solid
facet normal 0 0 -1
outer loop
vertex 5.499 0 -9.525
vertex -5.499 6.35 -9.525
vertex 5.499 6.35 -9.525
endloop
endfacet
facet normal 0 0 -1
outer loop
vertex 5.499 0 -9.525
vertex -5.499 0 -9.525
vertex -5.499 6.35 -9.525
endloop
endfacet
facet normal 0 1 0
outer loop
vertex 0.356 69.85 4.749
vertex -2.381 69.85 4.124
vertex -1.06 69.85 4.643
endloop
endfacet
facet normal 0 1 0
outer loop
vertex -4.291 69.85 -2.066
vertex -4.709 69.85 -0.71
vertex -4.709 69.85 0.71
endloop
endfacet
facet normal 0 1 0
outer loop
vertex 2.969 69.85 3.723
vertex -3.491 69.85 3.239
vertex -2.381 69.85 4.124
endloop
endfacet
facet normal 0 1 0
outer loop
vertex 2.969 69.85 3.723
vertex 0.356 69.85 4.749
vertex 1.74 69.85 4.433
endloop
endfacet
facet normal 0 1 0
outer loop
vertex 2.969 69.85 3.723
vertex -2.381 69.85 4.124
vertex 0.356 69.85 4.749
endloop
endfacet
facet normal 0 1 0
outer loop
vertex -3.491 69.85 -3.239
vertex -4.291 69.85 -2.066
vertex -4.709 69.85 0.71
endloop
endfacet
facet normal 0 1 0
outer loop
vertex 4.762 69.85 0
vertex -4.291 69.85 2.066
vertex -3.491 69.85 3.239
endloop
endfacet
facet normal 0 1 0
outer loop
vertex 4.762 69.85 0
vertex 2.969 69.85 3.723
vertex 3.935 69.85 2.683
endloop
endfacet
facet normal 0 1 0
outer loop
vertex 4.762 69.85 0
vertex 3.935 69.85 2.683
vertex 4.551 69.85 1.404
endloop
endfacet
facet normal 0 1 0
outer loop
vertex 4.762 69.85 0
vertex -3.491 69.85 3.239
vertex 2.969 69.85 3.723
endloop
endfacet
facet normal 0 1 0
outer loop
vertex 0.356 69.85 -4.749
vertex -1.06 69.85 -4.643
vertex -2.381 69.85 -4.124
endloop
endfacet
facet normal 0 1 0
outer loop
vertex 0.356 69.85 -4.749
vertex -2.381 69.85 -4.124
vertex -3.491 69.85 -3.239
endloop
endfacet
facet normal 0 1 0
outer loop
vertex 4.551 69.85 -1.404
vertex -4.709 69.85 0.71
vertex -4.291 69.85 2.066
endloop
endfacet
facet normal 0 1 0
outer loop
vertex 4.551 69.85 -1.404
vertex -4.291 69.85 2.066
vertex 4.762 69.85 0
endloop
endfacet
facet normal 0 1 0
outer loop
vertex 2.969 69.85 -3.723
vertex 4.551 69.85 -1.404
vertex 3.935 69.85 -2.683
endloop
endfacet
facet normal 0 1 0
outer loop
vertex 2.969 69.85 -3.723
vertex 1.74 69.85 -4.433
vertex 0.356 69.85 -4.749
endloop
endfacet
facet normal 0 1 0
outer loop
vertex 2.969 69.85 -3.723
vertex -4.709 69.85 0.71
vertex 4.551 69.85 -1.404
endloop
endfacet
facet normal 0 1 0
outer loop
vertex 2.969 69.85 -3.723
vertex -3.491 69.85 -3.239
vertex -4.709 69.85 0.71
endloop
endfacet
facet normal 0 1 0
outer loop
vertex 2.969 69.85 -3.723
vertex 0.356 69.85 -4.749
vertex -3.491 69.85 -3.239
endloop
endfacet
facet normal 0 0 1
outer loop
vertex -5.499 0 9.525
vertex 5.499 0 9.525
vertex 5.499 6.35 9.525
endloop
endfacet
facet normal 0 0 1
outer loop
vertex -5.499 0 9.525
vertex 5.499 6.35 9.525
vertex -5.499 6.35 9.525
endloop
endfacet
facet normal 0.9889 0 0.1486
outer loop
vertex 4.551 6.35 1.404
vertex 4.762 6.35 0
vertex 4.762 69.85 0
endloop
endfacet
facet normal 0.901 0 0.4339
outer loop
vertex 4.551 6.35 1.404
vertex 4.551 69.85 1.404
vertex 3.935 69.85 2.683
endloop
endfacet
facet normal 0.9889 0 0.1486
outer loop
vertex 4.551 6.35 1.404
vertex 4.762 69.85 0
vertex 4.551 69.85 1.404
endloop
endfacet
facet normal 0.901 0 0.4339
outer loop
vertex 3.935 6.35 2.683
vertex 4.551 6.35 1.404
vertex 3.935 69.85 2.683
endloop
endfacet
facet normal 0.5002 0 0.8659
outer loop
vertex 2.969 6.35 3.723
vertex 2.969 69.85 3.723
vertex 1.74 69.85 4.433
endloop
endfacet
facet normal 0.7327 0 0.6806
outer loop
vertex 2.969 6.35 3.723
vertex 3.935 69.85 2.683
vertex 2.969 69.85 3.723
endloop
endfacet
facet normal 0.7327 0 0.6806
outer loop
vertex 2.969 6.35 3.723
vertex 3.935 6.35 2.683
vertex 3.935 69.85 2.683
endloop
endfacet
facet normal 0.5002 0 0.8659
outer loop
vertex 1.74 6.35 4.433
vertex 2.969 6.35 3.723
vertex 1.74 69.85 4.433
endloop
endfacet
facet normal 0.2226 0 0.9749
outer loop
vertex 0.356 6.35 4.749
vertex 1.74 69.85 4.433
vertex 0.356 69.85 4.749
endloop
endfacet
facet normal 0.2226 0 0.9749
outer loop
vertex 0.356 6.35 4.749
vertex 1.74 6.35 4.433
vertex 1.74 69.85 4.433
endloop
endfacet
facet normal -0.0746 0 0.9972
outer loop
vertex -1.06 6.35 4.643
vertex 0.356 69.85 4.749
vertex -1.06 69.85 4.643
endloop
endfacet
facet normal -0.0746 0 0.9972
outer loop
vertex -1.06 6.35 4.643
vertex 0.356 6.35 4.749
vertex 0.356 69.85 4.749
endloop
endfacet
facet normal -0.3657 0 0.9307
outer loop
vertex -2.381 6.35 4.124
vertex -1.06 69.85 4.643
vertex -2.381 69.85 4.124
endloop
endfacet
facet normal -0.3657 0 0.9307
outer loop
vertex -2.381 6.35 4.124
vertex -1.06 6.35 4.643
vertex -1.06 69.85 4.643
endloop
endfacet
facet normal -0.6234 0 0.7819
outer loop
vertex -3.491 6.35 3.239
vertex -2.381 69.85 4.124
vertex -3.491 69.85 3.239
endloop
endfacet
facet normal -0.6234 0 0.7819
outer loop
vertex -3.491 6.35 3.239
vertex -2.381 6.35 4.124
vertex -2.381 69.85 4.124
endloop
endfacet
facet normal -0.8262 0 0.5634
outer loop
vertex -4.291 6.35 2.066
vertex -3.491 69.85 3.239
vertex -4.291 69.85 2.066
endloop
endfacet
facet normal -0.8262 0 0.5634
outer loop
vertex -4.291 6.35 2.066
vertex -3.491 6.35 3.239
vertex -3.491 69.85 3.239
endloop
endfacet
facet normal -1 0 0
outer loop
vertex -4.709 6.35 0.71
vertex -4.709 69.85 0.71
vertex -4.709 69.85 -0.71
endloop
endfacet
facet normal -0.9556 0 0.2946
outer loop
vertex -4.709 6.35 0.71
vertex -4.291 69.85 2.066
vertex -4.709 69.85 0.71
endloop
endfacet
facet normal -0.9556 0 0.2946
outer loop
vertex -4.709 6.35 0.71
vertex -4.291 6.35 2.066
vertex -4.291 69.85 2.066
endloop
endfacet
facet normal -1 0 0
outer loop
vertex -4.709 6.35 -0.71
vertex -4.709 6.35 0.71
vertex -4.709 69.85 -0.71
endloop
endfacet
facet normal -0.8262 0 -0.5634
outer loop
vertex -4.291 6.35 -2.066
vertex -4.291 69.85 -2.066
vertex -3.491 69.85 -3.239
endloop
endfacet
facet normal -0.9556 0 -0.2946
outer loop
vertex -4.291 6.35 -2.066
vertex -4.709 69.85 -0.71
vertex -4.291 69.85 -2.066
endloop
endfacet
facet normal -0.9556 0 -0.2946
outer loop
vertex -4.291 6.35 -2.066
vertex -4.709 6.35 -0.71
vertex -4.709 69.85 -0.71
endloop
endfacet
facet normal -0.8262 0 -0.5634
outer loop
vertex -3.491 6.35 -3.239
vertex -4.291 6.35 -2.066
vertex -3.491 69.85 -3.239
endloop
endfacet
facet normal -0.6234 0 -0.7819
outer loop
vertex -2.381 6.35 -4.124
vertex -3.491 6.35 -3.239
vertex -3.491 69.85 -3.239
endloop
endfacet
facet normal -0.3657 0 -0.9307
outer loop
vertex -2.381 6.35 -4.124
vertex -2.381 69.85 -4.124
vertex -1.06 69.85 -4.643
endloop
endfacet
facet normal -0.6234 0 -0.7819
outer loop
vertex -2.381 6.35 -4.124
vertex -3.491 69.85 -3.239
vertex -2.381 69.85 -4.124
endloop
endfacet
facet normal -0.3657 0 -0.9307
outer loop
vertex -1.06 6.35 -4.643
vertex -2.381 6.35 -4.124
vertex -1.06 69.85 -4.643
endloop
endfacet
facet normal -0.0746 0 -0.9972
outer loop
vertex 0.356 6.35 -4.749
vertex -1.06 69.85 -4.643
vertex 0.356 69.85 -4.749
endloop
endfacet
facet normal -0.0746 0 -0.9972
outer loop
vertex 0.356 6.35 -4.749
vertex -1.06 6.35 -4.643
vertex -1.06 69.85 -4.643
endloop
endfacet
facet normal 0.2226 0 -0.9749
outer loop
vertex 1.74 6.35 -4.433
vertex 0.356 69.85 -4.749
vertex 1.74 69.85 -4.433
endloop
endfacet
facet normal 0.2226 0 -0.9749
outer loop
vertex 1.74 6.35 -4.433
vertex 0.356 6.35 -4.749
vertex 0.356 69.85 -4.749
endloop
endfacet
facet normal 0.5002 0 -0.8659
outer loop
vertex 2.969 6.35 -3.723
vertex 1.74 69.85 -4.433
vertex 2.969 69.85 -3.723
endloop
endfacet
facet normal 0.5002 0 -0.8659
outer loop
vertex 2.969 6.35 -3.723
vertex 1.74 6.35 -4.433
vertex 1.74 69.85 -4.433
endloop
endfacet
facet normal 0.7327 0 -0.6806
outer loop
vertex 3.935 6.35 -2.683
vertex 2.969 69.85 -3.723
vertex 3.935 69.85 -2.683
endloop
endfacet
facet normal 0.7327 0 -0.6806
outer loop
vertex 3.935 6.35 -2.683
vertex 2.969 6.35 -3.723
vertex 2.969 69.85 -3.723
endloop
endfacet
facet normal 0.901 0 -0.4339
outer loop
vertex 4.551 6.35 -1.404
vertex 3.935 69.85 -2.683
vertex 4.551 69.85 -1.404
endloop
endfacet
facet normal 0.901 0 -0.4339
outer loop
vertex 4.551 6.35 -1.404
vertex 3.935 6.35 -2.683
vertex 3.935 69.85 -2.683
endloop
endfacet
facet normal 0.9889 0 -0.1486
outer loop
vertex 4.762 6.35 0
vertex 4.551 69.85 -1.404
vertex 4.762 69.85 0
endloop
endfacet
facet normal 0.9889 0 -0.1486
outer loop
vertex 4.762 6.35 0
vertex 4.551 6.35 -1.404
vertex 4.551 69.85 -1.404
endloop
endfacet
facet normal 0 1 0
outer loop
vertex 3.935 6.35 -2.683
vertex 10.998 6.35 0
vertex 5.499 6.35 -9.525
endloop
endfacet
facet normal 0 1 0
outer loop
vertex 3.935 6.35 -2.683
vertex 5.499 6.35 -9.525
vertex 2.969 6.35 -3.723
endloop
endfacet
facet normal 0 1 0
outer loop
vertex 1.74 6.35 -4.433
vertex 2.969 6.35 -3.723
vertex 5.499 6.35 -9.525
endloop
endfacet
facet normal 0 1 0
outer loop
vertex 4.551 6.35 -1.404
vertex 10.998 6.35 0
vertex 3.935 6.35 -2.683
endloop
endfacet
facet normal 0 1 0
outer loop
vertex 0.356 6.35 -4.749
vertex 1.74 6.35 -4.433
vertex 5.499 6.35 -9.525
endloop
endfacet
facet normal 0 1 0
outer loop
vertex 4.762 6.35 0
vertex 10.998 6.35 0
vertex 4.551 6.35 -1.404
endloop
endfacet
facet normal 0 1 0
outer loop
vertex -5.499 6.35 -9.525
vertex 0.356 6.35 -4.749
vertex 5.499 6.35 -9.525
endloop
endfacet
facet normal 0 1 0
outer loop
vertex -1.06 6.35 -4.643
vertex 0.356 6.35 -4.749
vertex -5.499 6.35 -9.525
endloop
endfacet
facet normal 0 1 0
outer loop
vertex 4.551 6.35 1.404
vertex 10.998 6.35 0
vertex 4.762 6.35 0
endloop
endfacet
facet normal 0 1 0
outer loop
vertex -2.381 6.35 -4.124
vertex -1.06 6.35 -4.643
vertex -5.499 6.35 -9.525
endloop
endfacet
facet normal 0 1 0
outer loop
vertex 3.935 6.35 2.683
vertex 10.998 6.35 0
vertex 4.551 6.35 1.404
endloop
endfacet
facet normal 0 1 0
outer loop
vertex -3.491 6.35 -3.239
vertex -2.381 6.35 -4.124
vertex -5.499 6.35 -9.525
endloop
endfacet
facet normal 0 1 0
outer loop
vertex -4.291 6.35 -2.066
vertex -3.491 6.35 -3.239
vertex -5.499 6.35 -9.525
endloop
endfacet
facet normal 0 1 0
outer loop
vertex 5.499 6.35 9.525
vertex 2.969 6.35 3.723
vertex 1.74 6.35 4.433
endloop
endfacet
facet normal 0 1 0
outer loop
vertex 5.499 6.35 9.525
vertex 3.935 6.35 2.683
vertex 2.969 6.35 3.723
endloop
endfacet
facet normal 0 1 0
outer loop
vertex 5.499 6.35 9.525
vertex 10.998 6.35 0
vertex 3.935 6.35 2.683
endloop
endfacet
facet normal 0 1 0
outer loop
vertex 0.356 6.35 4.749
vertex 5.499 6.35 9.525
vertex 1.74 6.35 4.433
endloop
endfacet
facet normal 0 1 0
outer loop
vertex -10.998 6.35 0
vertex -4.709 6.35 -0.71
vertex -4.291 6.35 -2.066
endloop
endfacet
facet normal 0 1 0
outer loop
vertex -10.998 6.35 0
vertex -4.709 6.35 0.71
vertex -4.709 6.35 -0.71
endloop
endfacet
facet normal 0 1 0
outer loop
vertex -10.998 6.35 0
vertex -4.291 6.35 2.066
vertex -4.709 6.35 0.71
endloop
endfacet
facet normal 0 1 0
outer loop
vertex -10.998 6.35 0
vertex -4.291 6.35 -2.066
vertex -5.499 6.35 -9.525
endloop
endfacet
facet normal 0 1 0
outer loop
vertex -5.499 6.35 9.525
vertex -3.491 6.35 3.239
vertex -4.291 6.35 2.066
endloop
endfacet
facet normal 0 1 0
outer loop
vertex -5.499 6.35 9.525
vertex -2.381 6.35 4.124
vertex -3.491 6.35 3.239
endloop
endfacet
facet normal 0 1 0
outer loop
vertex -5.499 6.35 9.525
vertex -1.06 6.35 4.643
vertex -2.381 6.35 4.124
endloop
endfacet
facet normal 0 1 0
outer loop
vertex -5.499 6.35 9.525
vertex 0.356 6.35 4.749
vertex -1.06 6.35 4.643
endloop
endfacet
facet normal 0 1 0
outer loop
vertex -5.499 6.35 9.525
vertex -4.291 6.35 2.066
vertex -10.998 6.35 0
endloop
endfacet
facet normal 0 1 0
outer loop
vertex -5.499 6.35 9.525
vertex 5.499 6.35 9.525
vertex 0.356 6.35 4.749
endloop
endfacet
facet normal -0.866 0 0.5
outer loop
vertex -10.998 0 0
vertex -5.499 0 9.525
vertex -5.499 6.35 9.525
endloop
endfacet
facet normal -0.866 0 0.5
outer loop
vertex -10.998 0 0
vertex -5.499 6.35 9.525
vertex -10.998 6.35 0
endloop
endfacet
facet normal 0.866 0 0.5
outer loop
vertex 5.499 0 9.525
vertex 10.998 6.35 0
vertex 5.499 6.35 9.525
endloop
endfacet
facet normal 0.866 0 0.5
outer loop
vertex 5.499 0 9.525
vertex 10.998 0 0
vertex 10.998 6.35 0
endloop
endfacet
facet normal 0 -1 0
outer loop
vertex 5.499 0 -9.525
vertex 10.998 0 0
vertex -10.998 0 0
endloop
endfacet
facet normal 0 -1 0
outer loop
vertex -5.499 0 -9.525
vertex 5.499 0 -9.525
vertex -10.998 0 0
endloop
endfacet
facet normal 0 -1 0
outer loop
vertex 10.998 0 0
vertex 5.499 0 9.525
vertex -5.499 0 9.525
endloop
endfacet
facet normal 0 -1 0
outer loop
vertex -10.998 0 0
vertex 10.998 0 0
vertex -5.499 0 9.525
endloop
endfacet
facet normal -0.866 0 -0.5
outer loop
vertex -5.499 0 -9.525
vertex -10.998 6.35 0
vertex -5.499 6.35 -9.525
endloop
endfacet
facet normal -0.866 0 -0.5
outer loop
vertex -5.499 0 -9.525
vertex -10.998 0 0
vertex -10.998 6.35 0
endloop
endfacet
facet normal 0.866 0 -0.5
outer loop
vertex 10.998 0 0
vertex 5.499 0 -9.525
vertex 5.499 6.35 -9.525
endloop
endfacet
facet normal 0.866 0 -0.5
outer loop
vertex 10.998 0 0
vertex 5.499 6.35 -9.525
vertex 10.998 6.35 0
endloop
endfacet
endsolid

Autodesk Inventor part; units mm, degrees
ref_plane "YZ Plane" through (0, 0, 0) normal (1, 0, 0) x (0, 1, 0)
ref_plane "XZ Plane" through (0, 0, 0) normal (0, 1, 0) x (-1, 0, 0)
ref_plane "XY Plane" through (0, 0, 0) normal (0, 0, 1) x (1, 0, 0)
sketch "Sketch1" plane through (0, 0, 0) normal (0, 1, 0) x (-1, 0, 0)
  line L0 (10.9985, 0) -> (5.4993, -9.525)
  line L1 (5.4993, -9.525) -> (-5.4993, -9.525)
  line L2 (-5.4993, -9.525) -> (-10.9985, 0)
  line L3 (-10.9985, 0) -> (-5.4993, 9.525)
  line L4 (-5.4993, 9.525) -> (5.4993, 9.525)
  line L5 (5.4993, 9.525) -> (10.9985, 0)
  point P0 (0, 0)
  point P1 (0, 0)
  dimension "d0" = 9.525
extrude "Extrusion1" add sketch "Sketch1" along normal blind 6.35
sketch "Sketch2" plane through (0, 6.35, 0) normal (0, 1, 0) x (1, 0, 0)
  circle A0 centre (0, 0) radius 4.7625
  dimension "d3" = 9.525
extrude "Extrusion2" add sketch "Sketch2" along normal blind 63.5
sketch "Sketch3" plane through (0, 0, 0) normal (0, -1, 0) x (1, 0, 0)
  point P0 (0, 0)
  point P1 (0, 0)
properties part number "3-8 2.5 Inch Hex Bolt"
